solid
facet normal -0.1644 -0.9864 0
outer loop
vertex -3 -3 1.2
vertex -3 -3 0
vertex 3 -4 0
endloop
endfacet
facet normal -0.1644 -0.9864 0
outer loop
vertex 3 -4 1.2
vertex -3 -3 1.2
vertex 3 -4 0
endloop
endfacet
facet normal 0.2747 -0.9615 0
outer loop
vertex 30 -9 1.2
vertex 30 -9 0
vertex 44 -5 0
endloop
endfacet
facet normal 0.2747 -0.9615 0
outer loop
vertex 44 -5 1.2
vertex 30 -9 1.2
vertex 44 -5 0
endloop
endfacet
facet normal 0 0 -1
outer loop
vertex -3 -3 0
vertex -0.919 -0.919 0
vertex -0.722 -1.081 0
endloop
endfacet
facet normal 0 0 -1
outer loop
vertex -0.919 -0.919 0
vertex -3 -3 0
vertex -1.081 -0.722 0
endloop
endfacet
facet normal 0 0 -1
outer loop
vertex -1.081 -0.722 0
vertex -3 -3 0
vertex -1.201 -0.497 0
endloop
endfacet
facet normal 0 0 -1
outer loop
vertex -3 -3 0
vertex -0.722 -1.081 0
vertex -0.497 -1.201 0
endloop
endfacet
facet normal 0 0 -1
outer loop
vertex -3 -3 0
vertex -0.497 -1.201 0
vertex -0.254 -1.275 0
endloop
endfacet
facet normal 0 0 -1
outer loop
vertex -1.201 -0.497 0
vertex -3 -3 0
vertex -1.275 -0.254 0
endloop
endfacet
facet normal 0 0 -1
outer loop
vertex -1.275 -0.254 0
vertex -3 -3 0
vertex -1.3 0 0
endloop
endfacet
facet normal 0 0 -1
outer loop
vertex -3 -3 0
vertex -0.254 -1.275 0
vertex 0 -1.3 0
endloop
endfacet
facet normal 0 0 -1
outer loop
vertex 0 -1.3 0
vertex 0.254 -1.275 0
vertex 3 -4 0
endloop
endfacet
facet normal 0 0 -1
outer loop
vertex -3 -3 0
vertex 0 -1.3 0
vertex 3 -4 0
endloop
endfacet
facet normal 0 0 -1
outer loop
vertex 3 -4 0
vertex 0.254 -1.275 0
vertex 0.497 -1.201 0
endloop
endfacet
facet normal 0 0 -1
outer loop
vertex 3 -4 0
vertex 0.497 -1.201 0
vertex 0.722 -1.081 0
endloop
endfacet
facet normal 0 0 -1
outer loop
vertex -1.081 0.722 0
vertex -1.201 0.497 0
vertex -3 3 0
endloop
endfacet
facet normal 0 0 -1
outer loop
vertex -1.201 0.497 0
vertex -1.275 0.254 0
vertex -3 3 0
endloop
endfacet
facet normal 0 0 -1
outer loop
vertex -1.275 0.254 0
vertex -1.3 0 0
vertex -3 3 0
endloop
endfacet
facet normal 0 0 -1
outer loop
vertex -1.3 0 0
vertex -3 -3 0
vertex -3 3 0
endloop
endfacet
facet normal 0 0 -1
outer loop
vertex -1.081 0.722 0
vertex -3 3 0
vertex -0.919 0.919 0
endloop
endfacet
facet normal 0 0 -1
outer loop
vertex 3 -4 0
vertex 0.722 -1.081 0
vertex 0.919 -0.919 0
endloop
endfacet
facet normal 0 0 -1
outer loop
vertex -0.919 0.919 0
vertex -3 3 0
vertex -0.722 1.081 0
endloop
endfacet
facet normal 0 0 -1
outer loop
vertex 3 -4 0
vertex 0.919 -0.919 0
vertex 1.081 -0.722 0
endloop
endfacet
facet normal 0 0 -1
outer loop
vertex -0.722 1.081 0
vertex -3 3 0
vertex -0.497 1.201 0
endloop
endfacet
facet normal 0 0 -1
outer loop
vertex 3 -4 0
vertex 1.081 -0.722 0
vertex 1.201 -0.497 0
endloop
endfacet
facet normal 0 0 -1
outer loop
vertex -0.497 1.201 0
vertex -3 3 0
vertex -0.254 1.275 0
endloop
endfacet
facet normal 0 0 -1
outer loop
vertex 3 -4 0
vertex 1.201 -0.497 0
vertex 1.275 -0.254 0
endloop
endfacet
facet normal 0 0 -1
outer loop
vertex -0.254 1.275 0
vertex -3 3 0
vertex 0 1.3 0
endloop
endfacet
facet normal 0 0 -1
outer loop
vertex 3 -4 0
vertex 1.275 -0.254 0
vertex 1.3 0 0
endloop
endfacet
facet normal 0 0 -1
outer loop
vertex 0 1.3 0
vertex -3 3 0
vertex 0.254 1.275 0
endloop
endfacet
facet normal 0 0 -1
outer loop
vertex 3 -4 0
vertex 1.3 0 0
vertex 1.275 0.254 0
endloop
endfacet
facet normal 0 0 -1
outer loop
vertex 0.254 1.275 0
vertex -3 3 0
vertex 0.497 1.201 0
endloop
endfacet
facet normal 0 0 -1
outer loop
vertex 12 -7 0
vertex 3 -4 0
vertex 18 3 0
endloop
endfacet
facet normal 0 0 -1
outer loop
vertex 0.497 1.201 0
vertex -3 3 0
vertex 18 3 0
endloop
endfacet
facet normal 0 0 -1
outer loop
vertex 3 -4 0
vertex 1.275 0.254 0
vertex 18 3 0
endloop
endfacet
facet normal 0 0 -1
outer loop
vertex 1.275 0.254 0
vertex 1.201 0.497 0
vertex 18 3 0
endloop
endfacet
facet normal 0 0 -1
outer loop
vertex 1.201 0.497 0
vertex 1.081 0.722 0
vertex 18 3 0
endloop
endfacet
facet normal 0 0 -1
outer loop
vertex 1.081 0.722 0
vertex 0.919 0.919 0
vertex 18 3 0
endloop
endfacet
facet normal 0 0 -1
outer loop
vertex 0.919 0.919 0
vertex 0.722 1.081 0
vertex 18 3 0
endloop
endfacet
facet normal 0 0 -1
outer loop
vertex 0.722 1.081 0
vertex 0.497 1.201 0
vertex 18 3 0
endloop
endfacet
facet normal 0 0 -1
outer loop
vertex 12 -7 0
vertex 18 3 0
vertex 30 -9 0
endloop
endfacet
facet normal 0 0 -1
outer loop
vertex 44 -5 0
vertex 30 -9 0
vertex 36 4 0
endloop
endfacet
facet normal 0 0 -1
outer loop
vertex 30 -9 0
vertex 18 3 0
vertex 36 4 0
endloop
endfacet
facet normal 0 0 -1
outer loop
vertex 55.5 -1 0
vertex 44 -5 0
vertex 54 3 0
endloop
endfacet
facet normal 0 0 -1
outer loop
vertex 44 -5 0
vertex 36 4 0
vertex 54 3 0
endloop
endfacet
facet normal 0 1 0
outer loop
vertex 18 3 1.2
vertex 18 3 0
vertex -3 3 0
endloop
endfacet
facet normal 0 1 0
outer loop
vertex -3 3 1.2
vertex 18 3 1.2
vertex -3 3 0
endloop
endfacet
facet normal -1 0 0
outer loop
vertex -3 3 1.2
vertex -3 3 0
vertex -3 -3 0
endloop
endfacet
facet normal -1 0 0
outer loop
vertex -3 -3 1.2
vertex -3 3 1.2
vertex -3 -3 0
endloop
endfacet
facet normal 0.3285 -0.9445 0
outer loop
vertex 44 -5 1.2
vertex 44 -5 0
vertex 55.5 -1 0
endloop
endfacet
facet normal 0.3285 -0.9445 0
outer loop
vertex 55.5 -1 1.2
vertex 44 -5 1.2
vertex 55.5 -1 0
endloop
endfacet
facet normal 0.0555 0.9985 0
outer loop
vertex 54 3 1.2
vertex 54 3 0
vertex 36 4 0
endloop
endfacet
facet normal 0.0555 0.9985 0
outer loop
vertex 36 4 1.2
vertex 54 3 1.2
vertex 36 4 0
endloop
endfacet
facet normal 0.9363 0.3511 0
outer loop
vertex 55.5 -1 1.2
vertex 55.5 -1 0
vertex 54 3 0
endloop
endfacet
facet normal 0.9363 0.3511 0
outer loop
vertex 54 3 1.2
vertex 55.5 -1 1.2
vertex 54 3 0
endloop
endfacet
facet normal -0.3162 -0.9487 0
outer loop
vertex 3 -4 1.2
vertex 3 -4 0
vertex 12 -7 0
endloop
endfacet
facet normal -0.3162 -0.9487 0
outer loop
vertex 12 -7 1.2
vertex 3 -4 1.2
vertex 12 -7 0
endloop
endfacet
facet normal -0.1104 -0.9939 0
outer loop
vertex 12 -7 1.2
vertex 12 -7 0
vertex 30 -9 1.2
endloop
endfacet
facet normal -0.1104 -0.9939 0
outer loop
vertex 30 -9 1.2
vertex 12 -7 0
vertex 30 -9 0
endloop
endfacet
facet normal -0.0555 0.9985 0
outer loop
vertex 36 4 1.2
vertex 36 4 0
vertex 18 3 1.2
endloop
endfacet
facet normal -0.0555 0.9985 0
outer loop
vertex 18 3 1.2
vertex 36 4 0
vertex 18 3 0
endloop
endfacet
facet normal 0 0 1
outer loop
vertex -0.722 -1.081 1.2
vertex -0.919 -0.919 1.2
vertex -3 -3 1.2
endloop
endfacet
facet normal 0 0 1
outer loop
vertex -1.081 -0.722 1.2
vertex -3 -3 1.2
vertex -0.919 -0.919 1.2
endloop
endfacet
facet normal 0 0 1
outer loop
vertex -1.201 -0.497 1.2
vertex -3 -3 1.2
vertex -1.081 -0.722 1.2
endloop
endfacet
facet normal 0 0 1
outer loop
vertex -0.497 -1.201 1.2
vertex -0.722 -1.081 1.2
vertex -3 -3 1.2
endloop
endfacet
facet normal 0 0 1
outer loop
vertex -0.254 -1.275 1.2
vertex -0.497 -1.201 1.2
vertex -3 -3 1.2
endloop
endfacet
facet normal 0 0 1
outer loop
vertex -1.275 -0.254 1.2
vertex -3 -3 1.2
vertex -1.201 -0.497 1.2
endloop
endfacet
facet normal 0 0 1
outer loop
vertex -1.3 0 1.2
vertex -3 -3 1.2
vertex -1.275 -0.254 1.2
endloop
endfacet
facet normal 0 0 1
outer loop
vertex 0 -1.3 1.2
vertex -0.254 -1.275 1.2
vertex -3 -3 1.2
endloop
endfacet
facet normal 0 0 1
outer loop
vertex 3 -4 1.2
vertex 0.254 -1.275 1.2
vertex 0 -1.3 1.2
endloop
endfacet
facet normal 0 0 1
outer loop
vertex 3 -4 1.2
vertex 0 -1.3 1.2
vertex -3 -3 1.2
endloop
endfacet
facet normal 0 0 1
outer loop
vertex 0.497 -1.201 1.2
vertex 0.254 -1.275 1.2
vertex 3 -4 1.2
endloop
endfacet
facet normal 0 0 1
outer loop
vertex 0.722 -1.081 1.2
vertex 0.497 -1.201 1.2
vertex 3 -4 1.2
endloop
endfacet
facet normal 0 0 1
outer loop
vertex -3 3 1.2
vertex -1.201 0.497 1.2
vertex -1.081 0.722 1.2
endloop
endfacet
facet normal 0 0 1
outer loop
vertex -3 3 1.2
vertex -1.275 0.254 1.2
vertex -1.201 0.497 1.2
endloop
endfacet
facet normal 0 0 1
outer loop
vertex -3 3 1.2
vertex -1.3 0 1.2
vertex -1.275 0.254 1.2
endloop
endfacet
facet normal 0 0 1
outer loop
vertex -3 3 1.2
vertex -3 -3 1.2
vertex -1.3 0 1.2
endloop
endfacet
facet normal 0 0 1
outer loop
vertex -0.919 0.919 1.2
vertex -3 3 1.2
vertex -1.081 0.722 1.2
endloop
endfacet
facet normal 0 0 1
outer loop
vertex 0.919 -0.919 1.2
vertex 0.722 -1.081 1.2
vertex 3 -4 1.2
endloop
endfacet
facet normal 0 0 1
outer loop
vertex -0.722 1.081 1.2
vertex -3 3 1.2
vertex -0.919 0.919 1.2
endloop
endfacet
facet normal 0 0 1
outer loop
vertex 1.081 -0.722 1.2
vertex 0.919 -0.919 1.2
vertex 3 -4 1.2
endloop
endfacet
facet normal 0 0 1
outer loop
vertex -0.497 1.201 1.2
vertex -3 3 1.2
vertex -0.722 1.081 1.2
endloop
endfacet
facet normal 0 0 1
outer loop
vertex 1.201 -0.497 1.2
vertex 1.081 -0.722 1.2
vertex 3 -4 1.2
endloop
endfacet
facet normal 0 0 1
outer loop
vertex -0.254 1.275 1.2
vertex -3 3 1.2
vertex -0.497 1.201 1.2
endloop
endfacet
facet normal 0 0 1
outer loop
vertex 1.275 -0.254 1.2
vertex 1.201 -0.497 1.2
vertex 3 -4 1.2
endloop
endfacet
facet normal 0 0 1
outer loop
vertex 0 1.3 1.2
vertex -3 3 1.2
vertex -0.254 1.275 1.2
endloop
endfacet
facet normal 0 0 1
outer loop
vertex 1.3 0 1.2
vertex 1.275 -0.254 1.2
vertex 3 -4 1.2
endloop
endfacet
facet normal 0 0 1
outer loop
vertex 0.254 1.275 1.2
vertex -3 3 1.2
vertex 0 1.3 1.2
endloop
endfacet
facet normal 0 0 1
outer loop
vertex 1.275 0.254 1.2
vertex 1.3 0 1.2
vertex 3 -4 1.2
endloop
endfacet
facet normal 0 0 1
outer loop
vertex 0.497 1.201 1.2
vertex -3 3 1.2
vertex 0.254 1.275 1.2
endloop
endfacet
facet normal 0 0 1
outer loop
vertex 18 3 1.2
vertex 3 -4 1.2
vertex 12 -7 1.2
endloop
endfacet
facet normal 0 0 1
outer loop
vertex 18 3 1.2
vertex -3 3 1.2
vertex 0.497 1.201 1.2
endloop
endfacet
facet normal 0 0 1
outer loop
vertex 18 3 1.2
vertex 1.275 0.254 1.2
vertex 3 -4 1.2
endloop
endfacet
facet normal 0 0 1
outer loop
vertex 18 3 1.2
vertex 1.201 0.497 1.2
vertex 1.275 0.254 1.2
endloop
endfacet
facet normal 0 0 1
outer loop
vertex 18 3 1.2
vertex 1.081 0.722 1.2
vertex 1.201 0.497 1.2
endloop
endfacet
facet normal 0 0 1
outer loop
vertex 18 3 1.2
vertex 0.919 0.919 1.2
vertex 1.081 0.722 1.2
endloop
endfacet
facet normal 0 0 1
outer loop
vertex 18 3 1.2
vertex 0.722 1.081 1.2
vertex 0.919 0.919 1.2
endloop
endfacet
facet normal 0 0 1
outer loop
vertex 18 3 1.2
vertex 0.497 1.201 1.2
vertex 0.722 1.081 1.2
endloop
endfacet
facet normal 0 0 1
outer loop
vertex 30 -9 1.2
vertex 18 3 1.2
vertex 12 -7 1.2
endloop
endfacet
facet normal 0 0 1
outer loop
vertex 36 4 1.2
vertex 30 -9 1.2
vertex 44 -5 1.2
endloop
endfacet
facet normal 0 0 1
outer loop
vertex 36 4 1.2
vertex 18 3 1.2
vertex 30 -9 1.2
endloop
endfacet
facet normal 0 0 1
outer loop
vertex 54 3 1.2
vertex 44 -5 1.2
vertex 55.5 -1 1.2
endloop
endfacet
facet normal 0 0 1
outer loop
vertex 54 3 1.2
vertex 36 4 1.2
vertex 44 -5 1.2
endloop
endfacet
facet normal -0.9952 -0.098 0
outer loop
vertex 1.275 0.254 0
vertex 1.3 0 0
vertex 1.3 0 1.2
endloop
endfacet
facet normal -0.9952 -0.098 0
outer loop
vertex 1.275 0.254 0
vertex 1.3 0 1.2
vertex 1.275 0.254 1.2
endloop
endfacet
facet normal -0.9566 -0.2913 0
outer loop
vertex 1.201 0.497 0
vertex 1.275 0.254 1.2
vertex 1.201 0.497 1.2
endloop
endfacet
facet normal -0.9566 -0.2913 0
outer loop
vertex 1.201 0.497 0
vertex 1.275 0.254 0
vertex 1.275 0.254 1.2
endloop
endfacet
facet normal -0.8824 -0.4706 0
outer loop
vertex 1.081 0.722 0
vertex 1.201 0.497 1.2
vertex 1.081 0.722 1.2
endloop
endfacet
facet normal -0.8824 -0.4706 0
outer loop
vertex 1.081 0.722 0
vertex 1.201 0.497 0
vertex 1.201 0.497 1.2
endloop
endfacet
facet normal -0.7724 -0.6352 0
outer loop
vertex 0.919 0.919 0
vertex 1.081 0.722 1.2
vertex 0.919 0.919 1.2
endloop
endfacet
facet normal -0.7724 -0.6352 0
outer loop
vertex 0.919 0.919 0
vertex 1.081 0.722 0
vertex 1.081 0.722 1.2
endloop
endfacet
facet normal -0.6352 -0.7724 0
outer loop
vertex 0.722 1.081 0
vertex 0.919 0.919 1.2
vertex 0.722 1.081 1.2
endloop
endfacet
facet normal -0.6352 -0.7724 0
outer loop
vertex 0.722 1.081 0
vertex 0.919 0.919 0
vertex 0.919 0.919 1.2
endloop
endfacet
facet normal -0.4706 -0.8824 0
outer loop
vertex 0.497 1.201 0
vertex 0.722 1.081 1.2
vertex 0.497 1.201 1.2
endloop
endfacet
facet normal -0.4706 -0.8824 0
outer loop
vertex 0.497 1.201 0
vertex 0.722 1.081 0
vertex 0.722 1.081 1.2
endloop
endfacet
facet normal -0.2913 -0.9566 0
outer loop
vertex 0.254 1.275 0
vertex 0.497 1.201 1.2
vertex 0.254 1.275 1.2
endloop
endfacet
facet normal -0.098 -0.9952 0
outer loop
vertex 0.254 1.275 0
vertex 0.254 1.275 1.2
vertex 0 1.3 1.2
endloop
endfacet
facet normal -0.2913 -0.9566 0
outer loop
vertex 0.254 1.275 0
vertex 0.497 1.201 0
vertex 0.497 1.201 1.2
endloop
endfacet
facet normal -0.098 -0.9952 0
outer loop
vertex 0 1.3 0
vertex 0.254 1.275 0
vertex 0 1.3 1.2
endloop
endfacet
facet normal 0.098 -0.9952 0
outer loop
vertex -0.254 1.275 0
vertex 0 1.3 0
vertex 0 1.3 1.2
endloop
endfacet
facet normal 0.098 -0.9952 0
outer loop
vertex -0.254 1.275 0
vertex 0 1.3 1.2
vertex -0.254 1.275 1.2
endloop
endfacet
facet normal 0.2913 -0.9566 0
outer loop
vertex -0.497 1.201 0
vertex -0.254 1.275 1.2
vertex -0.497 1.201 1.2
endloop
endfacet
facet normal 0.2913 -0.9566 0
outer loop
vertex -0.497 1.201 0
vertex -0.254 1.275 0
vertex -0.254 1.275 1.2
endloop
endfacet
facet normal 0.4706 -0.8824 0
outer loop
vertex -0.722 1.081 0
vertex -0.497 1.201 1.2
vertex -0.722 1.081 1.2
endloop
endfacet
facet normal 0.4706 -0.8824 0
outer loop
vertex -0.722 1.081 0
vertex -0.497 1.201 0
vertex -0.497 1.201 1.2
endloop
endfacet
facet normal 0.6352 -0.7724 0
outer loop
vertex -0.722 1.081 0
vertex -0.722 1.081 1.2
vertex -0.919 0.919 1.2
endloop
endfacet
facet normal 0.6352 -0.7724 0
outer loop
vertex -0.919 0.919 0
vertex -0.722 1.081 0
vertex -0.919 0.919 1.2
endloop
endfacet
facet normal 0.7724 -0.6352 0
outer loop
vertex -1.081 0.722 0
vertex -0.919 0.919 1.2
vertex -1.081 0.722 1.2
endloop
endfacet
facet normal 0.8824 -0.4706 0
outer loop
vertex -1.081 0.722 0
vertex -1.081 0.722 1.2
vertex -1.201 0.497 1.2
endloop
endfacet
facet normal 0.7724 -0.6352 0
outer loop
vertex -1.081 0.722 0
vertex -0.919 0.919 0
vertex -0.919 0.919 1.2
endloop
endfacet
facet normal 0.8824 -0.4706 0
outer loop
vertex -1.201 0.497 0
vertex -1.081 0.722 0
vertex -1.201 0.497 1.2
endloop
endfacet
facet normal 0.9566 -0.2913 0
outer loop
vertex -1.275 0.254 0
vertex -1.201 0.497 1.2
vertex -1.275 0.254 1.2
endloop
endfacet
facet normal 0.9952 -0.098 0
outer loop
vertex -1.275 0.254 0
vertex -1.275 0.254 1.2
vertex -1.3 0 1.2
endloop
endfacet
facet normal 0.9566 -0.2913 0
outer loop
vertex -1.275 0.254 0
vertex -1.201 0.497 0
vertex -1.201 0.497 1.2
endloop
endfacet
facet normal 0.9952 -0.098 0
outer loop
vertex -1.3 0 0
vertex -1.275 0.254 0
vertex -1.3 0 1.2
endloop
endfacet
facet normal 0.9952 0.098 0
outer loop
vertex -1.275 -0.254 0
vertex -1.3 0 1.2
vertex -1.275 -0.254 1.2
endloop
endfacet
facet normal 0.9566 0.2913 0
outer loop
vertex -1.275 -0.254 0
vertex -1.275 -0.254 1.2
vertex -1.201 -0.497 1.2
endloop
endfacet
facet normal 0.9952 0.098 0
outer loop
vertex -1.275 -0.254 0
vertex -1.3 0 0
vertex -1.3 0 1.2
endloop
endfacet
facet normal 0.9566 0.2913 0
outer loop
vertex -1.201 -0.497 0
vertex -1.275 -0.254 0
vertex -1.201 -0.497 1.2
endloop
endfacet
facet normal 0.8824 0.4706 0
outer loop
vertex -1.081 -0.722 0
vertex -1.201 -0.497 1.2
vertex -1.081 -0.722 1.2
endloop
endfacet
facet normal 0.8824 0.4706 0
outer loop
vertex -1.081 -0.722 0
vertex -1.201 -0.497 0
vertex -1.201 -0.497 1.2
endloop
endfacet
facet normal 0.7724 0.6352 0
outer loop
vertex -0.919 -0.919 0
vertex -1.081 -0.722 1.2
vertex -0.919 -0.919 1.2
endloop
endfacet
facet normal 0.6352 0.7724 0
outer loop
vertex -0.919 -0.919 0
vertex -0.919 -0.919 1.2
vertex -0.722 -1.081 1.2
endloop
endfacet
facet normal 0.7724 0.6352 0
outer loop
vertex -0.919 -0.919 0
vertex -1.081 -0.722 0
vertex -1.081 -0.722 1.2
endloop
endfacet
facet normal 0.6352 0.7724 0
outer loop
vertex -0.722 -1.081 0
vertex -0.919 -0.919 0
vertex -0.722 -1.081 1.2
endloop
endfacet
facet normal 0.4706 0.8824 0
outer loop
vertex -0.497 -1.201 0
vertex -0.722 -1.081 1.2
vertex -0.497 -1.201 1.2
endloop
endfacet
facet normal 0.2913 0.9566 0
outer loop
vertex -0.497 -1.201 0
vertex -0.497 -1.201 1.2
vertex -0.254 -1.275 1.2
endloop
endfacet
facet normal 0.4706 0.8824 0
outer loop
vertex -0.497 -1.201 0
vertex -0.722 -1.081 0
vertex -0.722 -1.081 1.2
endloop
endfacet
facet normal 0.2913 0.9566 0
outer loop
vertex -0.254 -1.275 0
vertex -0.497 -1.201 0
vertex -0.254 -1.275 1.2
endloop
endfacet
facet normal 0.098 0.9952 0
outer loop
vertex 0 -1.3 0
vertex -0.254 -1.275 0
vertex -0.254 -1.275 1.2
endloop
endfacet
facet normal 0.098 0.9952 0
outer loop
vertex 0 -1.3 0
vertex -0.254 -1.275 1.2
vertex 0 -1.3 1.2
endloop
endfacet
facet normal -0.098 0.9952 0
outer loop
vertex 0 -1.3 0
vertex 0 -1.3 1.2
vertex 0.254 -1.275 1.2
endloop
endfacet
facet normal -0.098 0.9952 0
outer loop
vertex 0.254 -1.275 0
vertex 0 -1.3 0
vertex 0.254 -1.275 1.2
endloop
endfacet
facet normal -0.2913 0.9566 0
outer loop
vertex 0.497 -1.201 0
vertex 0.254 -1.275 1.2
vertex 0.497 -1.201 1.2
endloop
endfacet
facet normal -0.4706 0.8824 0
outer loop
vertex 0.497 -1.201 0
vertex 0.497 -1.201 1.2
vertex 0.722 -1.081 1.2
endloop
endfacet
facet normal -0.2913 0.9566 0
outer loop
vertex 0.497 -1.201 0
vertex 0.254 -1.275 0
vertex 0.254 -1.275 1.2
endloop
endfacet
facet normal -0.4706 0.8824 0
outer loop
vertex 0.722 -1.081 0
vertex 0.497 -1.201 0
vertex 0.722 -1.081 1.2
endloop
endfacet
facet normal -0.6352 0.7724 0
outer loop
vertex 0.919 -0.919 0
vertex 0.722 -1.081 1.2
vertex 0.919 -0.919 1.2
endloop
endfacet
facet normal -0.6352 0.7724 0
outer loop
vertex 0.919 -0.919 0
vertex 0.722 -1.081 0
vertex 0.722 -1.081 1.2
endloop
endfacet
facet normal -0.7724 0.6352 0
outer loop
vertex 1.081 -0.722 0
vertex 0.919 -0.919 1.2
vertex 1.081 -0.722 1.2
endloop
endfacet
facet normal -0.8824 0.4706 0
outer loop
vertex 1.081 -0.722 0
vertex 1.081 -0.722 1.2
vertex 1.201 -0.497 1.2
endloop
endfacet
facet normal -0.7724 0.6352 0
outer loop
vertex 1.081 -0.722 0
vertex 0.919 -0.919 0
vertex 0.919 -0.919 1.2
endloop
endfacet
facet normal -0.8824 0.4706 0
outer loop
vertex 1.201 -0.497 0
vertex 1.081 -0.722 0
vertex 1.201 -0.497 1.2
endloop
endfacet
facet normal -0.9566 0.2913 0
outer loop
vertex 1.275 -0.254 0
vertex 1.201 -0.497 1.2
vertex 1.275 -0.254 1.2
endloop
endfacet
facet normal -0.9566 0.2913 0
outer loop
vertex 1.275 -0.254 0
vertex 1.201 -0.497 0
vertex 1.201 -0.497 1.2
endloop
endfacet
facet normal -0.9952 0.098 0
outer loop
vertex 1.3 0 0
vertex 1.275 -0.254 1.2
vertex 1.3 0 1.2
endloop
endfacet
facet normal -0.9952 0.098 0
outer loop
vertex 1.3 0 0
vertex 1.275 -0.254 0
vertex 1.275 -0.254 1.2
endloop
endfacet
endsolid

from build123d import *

# Parameters (mm, degrees)
SKETCH_1_R        = 1.3
EXTRUDE_127_DEPTH = 1.2


with BuildPart() as part:
    # 草图1 → 柔性桨叶包络_展开总径127 (new body)
    with BuildSketch(Plane.XY):
        Polygon((-3, -3), (3, -4), (12, -7), (30, -9), (44, -5), (55.5, -1), (54, 3), (36, 4), (18, 3), (4, 3), (-3, 3), align=None)
        Circle(SKETCH_1_R, mode=Mode.SUBTRACT)
    extrude(amount=EXTRUDE_127_DEPTH)


solid = part.part
